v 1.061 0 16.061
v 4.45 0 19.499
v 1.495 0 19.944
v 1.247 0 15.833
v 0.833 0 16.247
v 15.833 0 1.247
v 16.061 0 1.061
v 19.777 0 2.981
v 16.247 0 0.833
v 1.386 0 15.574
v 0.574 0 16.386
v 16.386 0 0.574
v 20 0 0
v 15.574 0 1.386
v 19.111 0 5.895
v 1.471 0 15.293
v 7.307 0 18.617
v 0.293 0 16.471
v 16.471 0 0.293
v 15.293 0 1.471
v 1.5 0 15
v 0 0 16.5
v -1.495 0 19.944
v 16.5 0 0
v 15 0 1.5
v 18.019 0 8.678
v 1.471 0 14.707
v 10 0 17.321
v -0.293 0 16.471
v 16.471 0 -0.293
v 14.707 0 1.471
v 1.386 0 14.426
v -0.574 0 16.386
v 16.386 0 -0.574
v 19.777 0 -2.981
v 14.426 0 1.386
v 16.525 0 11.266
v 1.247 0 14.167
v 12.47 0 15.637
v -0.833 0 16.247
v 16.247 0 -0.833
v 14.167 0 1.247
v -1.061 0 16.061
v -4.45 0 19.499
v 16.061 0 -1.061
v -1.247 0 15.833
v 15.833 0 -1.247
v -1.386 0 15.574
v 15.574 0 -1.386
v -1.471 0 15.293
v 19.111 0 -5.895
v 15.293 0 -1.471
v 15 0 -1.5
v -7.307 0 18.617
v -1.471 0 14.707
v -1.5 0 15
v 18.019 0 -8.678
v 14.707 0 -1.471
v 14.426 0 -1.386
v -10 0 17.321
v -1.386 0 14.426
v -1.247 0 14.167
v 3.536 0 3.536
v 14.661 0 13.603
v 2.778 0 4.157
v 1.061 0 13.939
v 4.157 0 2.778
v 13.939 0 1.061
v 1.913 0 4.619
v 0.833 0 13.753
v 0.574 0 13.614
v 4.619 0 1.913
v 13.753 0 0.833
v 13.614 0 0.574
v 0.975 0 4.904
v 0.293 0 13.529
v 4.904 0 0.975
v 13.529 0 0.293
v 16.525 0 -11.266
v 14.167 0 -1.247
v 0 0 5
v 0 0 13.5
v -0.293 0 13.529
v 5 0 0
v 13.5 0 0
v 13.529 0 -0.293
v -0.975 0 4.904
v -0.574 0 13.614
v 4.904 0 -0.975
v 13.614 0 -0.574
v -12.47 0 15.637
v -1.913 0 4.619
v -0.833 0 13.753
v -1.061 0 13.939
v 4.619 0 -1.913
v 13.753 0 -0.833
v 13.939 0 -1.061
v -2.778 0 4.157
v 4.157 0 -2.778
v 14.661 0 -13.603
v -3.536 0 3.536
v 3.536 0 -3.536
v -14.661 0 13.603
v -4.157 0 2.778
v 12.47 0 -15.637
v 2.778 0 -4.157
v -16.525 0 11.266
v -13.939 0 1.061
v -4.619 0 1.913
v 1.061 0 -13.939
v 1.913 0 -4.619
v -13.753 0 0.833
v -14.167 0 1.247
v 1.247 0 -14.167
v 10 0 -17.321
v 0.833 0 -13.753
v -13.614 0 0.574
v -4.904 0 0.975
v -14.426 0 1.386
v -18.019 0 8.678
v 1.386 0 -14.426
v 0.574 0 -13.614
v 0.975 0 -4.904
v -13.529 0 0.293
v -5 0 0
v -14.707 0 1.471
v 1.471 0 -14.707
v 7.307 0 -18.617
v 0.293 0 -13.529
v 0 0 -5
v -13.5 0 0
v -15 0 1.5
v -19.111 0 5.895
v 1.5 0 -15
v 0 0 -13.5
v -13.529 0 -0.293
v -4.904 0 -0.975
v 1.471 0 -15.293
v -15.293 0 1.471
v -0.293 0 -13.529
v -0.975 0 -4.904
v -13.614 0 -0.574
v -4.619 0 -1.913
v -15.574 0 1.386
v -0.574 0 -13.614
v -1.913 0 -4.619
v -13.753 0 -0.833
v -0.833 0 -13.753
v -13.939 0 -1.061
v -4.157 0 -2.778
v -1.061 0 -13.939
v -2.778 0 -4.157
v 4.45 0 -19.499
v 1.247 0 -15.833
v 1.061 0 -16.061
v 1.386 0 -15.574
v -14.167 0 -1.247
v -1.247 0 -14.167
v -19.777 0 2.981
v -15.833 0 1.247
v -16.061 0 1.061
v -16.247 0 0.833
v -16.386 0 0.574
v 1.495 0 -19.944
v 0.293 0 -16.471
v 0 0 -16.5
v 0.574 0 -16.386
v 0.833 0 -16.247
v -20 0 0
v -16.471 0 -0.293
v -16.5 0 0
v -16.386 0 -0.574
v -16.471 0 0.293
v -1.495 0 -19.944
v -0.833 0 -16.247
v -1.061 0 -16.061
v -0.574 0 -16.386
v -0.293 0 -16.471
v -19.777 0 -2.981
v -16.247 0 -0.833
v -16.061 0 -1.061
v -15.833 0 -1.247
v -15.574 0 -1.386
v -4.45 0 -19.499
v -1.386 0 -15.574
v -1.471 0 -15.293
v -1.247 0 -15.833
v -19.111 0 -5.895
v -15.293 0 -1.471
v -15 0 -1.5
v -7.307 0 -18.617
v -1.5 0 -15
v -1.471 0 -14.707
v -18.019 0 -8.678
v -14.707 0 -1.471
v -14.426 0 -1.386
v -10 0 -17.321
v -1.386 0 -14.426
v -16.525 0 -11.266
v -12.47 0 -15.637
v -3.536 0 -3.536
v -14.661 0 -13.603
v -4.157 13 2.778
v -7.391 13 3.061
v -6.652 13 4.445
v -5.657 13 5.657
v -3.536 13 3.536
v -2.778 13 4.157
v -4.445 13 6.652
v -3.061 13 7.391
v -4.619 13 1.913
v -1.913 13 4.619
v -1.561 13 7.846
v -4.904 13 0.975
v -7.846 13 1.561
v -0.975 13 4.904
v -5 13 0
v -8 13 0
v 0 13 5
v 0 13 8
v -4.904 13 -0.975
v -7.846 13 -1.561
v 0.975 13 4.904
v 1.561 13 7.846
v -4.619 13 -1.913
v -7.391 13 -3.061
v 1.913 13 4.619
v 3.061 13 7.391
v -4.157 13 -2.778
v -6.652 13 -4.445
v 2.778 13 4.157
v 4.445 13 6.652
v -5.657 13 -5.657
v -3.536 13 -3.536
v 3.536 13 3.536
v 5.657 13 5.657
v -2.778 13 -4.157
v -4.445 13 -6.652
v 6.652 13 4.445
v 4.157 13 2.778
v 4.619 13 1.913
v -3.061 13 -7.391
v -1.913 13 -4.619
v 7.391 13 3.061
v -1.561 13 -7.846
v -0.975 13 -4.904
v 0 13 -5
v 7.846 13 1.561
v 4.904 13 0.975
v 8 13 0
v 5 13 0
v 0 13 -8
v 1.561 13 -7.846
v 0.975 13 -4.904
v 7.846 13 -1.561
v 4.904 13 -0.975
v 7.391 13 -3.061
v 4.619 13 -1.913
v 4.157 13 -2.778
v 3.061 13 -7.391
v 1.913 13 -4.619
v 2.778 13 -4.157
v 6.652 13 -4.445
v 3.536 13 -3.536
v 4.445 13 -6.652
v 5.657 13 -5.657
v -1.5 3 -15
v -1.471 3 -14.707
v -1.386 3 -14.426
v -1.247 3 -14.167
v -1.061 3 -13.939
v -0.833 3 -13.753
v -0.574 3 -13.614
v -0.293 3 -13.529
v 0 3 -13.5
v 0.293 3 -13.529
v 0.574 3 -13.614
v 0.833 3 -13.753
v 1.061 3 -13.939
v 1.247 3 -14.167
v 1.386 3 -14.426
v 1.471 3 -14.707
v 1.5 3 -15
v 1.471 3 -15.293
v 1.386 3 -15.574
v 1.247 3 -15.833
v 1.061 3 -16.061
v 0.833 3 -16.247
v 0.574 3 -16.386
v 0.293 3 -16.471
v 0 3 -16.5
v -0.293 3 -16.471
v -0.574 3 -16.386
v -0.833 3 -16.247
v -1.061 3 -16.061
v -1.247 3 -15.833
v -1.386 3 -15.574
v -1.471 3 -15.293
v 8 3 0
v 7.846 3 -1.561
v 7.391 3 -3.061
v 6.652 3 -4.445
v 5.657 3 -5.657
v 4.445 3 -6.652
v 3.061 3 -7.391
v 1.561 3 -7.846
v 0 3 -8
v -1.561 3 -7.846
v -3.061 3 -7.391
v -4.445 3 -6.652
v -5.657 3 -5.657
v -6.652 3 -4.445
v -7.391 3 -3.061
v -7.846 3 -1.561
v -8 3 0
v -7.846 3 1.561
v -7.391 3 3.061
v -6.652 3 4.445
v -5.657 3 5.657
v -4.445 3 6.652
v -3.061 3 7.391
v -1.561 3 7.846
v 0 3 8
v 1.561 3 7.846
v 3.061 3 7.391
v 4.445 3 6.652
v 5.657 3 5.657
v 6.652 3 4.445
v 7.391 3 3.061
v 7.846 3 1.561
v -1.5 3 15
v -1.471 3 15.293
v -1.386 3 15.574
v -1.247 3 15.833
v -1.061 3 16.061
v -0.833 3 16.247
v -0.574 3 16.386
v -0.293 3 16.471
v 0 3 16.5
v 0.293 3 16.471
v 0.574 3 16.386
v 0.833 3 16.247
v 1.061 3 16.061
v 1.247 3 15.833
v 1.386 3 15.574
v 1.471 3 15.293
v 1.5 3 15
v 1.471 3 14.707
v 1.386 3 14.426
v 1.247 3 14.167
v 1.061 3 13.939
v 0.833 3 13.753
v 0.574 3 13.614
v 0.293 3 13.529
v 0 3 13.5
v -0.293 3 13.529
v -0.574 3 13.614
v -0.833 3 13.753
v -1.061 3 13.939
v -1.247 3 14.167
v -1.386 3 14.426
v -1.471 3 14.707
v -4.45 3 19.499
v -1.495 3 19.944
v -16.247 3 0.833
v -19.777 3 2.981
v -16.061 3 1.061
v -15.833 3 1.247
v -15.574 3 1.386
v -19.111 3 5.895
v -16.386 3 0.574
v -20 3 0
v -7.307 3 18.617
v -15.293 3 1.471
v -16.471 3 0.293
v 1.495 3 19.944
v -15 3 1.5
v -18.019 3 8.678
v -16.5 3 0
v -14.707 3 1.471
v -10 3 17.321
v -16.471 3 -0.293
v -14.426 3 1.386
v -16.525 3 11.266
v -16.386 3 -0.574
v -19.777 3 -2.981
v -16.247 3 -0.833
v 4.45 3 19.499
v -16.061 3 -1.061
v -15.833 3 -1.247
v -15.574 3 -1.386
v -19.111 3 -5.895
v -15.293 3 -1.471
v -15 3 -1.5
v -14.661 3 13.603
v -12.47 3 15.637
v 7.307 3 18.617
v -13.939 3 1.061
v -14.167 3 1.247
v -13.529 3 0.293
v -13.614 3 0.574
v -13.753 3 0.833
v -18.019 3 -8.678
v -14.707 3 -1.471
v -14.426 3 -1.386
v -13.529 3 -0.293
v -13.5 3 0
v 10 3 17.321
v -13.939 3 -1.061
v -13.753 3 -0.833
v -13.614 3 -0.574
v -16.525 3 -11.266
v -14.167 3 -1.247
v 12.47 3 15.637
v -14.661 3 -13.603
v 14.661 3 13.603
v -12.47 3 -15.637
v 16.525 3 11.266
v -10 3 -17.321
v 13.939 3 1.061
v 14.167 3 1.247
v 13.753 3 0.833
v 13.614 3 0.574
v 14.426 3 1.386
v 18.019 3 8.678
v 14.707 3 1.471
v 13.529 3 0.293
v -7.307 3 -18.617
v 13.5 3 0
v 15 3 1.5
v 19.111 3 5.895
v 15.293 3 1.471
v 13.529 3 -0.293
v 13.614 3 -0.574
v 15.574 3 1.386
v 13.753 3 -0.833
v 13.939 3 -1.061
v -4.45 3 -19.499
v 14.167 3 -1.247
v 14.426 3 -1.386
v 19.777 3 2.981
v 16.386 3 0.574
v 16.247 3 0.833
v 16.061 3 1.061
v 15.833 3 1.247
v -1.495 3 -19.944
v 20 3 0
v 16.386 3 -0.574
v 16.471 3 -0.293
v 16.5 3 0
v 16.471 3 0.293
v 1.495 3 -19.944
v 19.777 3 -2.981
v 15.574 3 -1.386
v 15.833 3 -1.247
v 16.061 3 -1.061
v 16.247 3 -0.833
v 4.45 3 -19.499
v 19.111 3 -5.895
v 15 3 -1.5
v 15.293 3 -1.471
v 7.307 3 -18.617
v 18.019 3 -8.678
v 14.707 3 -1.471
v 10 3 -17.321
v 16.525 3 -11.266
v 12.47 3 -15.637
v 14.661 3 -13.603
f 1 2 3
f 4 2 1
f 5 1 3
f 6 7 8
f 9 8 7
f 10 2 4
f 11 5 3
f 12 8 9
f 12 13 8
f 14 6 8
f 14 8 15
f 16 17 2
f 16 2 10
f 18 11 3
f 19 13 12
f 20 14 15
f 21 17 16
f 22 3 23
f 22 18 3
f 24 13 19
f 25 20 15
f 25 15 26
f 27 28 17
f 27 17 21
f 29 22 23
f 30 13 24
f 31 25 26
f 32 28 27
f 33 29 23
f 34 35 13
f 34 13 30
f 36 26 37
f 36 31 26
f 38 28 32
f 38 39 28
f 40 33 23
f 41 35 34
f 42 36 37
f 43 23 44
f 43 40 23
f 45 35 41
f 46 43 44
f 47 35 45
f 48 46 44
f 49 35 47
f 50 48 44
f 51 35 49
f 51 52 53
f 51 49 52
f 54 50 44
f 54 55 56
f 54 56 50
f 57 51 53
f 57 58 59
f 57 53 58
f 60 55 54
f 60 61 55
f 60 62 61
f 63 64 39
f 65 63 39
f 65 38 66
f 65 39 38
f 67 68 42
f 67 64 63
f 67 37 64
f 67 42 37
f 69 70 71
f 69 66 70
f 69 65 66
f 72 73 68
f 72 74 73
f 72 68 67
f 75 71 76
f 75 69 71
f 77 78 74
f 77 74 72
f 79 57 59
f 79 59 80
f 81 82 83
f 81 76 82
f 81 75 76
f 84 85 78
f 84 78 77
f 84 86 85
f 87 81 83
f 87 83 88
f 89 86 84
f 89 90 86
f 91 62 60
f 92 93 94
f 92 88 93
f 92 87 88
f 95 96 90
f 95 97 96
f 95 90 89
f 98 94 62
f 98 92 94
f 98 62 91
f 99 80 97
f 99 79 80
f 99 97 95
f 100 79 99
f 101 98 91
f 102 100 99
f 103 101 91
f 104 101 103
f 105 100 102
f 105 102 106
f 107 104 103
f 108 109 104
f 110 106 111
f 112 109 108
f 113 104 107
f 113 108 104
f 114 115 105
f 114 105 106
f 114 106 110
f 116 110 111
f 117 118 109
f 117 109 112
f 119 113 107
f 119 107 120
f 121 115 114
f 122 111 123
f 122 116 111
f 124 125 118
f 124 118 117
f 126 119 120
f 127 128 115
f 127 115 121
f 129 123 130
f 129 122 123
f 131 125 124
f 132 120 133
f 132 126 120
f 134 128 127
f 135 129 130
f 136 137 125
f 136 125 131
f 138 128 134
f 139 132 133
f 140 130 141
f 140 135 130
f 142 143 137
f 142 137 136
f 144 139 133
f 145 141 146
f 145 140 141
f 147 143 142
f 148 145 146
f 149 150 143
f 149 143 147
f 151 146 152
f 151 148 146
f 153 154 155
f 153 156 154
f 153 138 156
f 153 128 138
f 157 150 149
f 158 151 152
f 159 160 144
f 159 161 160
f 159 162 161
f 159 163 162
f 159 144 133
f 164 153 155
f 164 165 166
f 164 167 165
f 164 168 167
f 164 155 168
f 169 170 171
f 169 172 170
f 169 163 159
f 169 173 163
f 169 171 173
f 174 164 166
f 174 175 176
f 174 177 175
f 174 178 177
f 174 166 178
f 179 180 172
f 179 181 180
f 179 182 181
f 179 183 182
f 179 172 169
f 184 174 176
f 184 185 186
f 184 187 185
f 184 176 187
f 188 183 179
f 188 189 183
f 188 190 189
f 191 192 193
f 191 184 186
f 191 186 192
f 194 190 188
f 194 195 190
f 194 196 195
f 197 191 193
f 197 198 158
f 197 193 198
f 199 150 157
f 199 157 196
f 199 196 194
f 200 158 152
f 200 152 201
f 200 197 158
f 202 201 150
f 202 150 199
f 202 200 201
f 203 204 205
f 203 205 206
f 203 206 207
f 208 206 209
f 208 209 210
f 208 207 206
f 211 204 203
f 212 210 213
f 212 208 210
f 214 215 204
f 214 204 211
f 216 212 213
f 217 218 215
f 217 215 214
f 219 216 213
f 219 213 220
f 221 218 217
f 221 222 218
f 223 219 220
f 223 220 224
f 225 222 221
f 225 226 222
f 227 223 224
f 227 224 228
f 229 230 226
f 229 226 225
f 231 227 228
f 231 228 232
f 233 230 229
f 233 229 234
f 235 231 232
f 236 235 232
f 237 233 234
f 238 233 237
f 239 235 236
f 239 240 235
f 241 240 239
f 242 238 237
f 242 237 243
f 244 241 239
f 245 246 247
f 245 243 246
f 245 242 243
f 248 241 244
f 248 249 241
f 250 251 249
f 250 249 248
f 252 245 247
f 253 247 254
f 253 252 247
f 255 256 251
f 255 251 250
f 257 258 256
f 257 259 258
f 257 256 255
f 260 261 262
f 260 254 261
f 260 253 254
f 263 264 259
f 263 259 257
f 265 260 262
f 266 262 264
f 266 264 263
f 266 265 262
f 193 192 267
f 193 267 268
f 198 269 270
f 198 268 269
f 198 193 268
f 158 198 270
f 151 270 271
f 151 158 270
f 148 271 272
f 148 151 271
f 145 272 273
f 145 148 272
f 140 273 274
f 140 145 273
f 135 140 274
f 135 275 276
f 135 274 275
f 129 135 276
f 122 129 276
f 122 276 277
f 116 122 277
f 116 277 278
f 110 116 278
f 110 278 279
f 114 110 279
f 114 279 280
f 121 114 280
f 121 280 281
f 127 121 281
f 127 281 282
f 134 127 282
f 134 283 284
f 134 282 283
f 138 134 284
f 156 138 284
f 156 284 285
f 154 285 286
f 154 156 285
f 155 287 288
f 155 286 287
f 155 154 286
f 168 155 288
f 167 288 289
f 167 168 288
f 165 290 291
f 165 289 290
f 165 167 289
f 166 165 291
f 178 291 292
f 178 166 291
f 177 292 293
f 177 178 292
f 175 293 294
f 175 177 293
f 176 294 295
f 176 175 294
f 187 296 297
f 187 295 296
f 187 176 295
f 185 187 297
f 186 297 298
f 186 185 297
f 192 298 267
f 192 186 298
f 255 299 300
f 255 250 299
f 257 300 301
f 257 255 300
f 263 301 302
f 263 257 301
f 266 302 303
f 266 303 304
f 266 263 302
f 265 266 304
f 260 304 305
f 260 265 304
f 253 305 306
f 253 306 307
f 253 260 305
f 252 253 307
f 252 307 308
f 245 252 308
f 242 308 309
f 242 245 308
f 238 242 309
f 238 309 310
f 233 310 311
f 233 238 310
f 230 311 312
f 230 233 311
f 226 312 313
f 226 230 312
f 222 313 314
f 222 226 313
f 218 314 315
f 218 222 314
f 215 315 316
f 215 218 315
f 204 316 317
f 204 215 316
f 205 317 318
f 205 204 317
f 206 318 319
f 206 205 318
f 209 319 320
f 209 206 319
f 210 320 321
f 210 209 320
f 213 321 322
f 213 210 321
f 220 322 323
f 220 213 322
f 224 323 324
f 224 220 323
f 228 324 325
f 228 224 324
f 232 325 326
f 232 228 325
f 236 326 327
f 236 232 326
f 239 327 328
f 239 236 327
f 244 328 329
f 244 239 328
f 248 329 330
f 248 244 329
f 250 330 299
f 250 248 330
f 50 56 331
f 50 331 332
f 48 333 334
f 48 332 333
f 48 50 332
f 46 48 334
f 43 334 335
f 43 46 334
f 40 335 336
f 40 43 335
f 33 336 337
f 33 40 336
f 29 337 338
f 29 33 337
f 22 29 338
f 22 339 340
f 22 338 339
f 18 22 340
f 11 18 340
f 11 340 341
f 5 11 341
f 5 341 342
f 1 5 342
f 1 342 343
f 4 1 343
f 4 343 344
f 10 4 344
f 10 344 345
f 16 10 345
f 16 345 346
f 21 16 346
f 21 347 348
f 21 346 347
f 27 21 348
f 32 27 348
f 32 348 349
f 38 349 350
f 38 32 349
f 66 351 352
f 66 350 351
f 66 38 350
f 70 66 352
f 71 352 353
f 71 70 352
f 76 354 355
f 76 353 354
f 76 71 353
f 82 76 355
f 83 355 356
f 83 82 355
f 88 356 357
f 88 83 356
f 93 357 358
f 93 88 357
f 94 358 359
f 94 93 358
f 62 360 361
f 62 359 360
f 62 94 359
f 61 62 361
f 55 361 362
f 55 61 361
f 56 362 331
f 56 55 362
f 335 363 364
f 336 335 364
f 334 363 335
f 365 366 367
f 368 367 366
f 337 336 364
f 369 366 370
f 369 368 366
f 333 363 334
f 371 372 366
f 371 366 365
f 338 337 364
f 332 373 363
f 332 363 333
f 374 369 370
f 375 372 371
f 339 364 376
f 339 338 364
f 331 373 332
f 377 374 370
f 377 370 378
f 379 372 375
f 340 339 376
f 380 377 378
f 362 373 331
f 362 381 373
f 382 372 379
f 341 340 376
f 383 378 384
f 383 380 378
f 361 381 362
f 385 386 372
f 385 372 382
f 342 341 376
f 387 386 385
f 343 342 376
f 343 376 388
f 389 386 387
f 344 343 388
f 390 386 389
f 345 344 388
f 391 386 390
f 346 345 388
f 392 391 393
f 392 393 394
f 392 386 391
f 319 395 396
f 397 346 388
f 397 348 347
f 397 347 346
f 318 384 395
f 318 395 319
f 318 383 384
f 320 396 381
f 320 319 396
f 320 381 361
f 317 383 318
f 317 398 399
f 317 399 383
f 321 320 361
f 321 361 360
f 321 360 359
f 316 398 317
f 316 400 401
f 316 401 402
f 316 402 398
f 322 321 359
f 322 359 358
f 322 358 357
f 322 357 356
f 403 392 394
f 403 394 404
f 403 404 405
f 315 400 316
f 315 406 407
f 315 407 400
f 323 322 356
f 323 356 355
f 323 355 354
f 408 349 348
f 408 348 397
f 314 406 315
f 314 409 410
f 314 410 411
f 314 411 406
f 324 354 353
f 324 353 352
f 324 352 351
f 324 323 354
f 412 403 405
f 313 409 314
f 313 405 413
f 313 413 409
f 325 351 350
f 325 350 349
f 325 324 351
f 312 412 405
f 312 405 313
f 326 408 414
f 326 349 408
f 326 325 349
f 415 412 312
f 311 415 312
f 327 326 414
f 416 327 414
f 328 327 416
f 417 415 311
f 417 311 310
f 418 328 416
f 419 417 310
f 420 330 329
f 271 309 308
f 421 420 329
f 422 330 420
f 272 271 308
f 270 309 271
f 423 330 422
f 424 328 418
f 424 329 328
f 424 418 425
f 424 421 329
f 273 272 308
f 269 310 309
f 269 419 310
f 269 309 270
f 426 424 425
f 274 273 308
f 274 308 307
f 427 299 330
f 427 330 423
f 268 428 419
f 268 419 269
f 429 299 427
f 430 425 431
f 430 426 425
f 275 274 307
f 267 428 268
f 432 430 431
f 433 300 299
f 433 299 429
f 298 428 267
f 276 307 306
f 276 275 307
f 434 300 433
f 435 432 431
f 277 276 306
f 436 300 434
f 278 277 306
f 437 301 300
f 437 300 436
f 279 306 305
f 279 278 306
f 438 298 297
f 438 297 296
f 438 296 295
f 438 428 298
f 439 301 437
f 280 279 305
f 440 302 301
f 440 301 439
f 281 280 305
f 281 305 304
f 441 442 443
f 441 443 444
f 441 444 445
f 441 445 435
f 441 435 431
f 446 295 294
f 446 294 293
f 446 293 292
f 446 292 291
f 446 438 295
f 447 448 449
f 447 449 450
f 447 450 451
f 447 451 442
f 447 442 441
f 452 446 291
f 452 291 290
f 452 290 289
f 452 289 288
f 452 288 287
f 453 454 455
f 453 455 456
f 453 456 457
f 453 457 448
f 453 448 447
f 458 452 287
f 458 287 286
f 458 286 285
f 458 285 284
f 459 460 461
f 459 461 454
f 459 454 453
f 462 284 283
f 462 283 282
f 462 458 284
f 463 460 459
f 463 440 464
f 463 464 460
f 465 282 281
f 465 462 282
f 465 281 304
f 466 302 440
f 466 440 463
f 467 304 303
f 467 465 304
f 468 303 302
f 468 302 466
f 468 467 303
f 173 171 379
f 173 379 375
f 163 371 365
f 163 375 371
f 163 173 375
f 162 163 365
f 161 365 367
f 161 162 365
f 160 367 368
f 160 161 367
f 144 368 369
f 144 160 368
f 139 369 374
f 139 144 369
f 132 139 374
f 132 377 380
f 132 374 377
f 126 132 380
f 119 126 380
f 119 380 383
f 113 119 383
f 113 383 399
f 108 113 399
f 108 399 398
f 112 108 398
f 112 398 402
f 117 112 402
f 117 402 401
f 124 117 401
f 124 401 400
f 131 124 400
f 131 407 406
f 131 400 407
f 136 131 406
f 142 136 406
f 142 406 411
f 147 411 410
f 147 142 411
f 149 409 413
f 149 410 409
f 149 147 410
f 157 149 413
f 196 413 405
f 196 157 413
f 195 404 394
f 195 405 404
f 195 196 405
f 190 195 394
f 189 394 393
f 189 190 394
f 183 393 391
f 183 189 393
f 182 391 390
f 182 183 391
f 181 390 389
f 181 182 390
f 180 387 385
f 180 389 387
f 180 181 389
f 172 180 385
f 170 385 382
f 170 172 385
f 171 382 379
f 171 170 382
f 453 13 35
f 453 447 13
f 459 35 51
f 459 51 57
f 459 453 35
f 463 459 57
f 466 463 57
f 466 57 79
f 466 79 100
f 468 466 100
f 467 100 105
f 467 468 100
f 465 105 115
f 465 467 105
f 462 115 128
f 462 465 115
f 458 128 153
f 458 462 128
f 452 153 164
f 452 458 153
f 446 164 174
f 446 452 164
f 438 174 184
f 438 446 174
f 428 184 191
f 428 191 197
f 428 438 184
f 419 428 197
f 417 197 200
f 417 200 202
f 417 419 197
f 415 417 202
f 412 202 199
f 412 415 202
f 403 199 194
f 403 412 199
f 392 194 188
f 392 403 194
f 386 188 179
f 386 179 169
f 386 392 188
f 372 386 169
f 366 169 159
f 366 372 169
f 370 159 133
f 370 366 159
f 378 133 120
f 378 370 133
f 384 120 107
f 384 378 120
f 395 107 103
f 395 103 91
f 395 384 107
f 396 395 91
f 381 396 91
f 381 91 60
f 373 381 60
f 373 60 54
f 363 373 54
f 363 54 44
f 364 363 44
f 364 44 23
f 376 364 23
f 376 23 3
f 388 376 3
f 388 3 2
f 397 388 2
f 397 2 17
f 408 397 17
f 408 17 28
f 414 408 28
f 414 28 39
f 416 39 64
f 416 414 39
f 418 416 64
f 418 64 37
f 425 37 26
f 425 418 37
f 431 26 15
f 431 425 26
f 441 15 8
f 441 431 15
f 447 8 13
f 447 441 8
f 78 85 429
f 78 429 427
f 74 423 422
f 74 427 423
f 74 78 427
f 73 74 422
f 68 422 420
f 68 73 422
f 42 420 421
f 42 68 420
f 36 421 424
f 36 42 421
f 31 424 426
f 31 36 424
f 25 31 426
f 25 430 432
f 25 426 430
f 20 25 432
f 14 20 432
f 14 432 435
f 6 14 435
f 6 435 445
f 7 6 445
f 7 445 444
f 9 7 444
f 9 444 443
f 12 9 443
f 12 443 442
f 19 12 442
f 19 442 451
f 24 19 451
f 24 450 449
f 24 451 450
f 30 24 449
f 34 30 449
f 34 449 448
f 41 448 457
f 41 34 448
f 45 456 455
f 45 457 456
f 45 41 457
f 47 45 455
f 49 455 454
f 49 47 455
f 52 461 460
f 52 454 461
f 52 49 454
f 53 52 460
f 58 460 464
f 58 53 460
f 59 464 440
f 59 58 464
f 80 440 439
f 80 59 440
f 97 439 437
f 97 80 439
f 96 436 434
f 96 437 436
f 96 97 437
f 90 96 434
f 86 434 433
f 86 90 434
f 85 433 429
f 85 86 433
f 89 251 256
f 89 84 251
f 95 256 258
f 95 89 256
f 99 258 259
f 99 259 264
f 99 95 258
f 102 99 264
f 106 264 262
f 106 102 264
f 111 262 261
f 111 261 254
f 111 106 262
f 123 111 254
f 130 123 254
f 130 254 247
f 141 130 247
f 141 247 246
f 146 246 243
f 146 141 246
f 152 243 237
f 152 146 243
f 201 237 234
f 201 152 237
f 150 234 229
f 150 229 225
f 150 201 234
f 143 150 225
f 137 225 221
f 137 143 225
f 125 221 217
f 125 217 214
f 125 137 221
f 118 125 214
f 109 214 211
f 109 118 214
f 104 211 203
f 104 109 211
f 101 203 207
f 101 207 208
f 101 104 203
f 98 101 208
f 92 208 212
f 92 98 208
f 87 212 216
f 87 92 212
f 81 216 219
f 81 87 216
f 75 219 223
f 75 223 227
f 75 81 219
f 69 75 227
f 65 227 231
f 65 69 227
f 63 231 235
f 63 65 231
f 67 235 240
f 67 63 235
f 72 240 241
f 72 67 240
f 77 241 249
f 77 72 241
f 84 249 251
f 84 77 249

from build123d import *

# Parameters (mm, degrees)
CUT_EXTRUDE_1_DEPTH      = 31
CUT_EXTRUDE_1_DEPTH_BACK = 31
SKETCH_2_R               = 1.5


with BuildPart() as part:
    # 草图1 → 旋转1 (revolve)
    with BuildSketch(Plane.XY, mode=Mode.PRIVATE) as revolve_1_sk:
        Polygon((-5, 0), (-20, 0), (-20, 3), (-8, 3), (-8, 13), (-5, 13), align=None)
    revolve(revolve_1_sk.sketch.rotate(Axis((0, -573.614855465, 0), (0, 1, 0)), 180), axis=Axis((0, -573.614855465, 0), (0, 1, 0)))

    # 草图2 → 切除-拉伸1 (cut, two sides: drawn at the far end of the back side and taken through both)
    with BuildSketch(Plane(origin=(0, 3, 0), x_dir=(1, 0, 0), z_dir=(0, 1, 0)).offset(-CUT_EXTRUDE_1_DEPTH_BACK)):
        with Locations(Location((0, 15, 0), (0, 0, 180))):
            Circle(SKETCH_2_R)
        with Locations(Location((15, 0, 0), (0, 0, 180))):
            Circle(SKETCH_2_R)
        with Locations(Location((0, -15, 0), (0, 0, 180))):
            Circle(SKETCH_2_R)
        with Locations(Location((-15, 0, 0), (0, 0, 180))):
            Circle(SKETCH_2_R)
    extrude(amount=CUT_EXTRUDE_1_DEPTH + CUT_EXTRUDE_1_DEPTH_BACK, mode=Mode.SUBTRACT)


solid = part.part
